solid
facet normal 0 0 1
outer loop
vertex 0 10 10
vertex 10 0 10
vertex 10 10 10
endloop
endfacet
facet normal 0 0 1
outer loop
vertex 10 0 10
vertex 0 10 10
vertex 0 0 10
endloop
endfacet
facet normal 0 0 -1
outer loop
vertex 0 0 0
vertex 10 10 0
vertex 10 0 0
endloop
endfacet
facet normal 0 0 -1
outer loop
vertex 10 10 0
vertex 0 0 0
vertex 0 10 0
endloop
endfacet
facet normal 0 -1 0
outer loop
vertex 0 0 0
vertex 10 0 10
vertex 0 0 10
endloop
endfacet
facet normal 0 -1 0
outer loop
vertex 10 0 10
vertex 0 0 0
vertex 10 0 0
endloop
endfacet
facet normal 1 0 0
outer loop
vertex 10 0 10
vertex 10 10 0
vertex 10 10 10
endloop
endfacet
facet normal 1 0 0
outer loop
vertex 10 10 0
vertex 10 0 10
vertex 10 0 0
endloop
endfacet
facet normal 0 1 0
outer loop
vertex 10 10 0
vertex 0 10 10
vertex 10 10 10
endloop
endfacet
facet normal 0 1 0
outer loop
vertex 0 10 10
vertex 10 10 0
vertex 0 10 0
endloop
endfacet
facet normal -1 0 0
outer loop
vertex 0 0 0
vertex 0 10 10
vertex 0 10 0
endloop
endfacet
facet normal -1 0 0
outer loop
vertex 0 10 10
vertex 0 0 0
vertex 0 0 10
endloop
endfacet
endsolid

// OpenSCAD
module beam(h=10,size=10)
{

	scale([size/10,size/10,1])linear_extrude(file = "BeamOutline.dxf", 
  height = h, center = false);
	 
		
}

beam(h=10,size=20); 
translate([15,0,0]) beam(h=30); 
translate([30,0,0]) beam(h=40); 
cube([10,10,10]);
